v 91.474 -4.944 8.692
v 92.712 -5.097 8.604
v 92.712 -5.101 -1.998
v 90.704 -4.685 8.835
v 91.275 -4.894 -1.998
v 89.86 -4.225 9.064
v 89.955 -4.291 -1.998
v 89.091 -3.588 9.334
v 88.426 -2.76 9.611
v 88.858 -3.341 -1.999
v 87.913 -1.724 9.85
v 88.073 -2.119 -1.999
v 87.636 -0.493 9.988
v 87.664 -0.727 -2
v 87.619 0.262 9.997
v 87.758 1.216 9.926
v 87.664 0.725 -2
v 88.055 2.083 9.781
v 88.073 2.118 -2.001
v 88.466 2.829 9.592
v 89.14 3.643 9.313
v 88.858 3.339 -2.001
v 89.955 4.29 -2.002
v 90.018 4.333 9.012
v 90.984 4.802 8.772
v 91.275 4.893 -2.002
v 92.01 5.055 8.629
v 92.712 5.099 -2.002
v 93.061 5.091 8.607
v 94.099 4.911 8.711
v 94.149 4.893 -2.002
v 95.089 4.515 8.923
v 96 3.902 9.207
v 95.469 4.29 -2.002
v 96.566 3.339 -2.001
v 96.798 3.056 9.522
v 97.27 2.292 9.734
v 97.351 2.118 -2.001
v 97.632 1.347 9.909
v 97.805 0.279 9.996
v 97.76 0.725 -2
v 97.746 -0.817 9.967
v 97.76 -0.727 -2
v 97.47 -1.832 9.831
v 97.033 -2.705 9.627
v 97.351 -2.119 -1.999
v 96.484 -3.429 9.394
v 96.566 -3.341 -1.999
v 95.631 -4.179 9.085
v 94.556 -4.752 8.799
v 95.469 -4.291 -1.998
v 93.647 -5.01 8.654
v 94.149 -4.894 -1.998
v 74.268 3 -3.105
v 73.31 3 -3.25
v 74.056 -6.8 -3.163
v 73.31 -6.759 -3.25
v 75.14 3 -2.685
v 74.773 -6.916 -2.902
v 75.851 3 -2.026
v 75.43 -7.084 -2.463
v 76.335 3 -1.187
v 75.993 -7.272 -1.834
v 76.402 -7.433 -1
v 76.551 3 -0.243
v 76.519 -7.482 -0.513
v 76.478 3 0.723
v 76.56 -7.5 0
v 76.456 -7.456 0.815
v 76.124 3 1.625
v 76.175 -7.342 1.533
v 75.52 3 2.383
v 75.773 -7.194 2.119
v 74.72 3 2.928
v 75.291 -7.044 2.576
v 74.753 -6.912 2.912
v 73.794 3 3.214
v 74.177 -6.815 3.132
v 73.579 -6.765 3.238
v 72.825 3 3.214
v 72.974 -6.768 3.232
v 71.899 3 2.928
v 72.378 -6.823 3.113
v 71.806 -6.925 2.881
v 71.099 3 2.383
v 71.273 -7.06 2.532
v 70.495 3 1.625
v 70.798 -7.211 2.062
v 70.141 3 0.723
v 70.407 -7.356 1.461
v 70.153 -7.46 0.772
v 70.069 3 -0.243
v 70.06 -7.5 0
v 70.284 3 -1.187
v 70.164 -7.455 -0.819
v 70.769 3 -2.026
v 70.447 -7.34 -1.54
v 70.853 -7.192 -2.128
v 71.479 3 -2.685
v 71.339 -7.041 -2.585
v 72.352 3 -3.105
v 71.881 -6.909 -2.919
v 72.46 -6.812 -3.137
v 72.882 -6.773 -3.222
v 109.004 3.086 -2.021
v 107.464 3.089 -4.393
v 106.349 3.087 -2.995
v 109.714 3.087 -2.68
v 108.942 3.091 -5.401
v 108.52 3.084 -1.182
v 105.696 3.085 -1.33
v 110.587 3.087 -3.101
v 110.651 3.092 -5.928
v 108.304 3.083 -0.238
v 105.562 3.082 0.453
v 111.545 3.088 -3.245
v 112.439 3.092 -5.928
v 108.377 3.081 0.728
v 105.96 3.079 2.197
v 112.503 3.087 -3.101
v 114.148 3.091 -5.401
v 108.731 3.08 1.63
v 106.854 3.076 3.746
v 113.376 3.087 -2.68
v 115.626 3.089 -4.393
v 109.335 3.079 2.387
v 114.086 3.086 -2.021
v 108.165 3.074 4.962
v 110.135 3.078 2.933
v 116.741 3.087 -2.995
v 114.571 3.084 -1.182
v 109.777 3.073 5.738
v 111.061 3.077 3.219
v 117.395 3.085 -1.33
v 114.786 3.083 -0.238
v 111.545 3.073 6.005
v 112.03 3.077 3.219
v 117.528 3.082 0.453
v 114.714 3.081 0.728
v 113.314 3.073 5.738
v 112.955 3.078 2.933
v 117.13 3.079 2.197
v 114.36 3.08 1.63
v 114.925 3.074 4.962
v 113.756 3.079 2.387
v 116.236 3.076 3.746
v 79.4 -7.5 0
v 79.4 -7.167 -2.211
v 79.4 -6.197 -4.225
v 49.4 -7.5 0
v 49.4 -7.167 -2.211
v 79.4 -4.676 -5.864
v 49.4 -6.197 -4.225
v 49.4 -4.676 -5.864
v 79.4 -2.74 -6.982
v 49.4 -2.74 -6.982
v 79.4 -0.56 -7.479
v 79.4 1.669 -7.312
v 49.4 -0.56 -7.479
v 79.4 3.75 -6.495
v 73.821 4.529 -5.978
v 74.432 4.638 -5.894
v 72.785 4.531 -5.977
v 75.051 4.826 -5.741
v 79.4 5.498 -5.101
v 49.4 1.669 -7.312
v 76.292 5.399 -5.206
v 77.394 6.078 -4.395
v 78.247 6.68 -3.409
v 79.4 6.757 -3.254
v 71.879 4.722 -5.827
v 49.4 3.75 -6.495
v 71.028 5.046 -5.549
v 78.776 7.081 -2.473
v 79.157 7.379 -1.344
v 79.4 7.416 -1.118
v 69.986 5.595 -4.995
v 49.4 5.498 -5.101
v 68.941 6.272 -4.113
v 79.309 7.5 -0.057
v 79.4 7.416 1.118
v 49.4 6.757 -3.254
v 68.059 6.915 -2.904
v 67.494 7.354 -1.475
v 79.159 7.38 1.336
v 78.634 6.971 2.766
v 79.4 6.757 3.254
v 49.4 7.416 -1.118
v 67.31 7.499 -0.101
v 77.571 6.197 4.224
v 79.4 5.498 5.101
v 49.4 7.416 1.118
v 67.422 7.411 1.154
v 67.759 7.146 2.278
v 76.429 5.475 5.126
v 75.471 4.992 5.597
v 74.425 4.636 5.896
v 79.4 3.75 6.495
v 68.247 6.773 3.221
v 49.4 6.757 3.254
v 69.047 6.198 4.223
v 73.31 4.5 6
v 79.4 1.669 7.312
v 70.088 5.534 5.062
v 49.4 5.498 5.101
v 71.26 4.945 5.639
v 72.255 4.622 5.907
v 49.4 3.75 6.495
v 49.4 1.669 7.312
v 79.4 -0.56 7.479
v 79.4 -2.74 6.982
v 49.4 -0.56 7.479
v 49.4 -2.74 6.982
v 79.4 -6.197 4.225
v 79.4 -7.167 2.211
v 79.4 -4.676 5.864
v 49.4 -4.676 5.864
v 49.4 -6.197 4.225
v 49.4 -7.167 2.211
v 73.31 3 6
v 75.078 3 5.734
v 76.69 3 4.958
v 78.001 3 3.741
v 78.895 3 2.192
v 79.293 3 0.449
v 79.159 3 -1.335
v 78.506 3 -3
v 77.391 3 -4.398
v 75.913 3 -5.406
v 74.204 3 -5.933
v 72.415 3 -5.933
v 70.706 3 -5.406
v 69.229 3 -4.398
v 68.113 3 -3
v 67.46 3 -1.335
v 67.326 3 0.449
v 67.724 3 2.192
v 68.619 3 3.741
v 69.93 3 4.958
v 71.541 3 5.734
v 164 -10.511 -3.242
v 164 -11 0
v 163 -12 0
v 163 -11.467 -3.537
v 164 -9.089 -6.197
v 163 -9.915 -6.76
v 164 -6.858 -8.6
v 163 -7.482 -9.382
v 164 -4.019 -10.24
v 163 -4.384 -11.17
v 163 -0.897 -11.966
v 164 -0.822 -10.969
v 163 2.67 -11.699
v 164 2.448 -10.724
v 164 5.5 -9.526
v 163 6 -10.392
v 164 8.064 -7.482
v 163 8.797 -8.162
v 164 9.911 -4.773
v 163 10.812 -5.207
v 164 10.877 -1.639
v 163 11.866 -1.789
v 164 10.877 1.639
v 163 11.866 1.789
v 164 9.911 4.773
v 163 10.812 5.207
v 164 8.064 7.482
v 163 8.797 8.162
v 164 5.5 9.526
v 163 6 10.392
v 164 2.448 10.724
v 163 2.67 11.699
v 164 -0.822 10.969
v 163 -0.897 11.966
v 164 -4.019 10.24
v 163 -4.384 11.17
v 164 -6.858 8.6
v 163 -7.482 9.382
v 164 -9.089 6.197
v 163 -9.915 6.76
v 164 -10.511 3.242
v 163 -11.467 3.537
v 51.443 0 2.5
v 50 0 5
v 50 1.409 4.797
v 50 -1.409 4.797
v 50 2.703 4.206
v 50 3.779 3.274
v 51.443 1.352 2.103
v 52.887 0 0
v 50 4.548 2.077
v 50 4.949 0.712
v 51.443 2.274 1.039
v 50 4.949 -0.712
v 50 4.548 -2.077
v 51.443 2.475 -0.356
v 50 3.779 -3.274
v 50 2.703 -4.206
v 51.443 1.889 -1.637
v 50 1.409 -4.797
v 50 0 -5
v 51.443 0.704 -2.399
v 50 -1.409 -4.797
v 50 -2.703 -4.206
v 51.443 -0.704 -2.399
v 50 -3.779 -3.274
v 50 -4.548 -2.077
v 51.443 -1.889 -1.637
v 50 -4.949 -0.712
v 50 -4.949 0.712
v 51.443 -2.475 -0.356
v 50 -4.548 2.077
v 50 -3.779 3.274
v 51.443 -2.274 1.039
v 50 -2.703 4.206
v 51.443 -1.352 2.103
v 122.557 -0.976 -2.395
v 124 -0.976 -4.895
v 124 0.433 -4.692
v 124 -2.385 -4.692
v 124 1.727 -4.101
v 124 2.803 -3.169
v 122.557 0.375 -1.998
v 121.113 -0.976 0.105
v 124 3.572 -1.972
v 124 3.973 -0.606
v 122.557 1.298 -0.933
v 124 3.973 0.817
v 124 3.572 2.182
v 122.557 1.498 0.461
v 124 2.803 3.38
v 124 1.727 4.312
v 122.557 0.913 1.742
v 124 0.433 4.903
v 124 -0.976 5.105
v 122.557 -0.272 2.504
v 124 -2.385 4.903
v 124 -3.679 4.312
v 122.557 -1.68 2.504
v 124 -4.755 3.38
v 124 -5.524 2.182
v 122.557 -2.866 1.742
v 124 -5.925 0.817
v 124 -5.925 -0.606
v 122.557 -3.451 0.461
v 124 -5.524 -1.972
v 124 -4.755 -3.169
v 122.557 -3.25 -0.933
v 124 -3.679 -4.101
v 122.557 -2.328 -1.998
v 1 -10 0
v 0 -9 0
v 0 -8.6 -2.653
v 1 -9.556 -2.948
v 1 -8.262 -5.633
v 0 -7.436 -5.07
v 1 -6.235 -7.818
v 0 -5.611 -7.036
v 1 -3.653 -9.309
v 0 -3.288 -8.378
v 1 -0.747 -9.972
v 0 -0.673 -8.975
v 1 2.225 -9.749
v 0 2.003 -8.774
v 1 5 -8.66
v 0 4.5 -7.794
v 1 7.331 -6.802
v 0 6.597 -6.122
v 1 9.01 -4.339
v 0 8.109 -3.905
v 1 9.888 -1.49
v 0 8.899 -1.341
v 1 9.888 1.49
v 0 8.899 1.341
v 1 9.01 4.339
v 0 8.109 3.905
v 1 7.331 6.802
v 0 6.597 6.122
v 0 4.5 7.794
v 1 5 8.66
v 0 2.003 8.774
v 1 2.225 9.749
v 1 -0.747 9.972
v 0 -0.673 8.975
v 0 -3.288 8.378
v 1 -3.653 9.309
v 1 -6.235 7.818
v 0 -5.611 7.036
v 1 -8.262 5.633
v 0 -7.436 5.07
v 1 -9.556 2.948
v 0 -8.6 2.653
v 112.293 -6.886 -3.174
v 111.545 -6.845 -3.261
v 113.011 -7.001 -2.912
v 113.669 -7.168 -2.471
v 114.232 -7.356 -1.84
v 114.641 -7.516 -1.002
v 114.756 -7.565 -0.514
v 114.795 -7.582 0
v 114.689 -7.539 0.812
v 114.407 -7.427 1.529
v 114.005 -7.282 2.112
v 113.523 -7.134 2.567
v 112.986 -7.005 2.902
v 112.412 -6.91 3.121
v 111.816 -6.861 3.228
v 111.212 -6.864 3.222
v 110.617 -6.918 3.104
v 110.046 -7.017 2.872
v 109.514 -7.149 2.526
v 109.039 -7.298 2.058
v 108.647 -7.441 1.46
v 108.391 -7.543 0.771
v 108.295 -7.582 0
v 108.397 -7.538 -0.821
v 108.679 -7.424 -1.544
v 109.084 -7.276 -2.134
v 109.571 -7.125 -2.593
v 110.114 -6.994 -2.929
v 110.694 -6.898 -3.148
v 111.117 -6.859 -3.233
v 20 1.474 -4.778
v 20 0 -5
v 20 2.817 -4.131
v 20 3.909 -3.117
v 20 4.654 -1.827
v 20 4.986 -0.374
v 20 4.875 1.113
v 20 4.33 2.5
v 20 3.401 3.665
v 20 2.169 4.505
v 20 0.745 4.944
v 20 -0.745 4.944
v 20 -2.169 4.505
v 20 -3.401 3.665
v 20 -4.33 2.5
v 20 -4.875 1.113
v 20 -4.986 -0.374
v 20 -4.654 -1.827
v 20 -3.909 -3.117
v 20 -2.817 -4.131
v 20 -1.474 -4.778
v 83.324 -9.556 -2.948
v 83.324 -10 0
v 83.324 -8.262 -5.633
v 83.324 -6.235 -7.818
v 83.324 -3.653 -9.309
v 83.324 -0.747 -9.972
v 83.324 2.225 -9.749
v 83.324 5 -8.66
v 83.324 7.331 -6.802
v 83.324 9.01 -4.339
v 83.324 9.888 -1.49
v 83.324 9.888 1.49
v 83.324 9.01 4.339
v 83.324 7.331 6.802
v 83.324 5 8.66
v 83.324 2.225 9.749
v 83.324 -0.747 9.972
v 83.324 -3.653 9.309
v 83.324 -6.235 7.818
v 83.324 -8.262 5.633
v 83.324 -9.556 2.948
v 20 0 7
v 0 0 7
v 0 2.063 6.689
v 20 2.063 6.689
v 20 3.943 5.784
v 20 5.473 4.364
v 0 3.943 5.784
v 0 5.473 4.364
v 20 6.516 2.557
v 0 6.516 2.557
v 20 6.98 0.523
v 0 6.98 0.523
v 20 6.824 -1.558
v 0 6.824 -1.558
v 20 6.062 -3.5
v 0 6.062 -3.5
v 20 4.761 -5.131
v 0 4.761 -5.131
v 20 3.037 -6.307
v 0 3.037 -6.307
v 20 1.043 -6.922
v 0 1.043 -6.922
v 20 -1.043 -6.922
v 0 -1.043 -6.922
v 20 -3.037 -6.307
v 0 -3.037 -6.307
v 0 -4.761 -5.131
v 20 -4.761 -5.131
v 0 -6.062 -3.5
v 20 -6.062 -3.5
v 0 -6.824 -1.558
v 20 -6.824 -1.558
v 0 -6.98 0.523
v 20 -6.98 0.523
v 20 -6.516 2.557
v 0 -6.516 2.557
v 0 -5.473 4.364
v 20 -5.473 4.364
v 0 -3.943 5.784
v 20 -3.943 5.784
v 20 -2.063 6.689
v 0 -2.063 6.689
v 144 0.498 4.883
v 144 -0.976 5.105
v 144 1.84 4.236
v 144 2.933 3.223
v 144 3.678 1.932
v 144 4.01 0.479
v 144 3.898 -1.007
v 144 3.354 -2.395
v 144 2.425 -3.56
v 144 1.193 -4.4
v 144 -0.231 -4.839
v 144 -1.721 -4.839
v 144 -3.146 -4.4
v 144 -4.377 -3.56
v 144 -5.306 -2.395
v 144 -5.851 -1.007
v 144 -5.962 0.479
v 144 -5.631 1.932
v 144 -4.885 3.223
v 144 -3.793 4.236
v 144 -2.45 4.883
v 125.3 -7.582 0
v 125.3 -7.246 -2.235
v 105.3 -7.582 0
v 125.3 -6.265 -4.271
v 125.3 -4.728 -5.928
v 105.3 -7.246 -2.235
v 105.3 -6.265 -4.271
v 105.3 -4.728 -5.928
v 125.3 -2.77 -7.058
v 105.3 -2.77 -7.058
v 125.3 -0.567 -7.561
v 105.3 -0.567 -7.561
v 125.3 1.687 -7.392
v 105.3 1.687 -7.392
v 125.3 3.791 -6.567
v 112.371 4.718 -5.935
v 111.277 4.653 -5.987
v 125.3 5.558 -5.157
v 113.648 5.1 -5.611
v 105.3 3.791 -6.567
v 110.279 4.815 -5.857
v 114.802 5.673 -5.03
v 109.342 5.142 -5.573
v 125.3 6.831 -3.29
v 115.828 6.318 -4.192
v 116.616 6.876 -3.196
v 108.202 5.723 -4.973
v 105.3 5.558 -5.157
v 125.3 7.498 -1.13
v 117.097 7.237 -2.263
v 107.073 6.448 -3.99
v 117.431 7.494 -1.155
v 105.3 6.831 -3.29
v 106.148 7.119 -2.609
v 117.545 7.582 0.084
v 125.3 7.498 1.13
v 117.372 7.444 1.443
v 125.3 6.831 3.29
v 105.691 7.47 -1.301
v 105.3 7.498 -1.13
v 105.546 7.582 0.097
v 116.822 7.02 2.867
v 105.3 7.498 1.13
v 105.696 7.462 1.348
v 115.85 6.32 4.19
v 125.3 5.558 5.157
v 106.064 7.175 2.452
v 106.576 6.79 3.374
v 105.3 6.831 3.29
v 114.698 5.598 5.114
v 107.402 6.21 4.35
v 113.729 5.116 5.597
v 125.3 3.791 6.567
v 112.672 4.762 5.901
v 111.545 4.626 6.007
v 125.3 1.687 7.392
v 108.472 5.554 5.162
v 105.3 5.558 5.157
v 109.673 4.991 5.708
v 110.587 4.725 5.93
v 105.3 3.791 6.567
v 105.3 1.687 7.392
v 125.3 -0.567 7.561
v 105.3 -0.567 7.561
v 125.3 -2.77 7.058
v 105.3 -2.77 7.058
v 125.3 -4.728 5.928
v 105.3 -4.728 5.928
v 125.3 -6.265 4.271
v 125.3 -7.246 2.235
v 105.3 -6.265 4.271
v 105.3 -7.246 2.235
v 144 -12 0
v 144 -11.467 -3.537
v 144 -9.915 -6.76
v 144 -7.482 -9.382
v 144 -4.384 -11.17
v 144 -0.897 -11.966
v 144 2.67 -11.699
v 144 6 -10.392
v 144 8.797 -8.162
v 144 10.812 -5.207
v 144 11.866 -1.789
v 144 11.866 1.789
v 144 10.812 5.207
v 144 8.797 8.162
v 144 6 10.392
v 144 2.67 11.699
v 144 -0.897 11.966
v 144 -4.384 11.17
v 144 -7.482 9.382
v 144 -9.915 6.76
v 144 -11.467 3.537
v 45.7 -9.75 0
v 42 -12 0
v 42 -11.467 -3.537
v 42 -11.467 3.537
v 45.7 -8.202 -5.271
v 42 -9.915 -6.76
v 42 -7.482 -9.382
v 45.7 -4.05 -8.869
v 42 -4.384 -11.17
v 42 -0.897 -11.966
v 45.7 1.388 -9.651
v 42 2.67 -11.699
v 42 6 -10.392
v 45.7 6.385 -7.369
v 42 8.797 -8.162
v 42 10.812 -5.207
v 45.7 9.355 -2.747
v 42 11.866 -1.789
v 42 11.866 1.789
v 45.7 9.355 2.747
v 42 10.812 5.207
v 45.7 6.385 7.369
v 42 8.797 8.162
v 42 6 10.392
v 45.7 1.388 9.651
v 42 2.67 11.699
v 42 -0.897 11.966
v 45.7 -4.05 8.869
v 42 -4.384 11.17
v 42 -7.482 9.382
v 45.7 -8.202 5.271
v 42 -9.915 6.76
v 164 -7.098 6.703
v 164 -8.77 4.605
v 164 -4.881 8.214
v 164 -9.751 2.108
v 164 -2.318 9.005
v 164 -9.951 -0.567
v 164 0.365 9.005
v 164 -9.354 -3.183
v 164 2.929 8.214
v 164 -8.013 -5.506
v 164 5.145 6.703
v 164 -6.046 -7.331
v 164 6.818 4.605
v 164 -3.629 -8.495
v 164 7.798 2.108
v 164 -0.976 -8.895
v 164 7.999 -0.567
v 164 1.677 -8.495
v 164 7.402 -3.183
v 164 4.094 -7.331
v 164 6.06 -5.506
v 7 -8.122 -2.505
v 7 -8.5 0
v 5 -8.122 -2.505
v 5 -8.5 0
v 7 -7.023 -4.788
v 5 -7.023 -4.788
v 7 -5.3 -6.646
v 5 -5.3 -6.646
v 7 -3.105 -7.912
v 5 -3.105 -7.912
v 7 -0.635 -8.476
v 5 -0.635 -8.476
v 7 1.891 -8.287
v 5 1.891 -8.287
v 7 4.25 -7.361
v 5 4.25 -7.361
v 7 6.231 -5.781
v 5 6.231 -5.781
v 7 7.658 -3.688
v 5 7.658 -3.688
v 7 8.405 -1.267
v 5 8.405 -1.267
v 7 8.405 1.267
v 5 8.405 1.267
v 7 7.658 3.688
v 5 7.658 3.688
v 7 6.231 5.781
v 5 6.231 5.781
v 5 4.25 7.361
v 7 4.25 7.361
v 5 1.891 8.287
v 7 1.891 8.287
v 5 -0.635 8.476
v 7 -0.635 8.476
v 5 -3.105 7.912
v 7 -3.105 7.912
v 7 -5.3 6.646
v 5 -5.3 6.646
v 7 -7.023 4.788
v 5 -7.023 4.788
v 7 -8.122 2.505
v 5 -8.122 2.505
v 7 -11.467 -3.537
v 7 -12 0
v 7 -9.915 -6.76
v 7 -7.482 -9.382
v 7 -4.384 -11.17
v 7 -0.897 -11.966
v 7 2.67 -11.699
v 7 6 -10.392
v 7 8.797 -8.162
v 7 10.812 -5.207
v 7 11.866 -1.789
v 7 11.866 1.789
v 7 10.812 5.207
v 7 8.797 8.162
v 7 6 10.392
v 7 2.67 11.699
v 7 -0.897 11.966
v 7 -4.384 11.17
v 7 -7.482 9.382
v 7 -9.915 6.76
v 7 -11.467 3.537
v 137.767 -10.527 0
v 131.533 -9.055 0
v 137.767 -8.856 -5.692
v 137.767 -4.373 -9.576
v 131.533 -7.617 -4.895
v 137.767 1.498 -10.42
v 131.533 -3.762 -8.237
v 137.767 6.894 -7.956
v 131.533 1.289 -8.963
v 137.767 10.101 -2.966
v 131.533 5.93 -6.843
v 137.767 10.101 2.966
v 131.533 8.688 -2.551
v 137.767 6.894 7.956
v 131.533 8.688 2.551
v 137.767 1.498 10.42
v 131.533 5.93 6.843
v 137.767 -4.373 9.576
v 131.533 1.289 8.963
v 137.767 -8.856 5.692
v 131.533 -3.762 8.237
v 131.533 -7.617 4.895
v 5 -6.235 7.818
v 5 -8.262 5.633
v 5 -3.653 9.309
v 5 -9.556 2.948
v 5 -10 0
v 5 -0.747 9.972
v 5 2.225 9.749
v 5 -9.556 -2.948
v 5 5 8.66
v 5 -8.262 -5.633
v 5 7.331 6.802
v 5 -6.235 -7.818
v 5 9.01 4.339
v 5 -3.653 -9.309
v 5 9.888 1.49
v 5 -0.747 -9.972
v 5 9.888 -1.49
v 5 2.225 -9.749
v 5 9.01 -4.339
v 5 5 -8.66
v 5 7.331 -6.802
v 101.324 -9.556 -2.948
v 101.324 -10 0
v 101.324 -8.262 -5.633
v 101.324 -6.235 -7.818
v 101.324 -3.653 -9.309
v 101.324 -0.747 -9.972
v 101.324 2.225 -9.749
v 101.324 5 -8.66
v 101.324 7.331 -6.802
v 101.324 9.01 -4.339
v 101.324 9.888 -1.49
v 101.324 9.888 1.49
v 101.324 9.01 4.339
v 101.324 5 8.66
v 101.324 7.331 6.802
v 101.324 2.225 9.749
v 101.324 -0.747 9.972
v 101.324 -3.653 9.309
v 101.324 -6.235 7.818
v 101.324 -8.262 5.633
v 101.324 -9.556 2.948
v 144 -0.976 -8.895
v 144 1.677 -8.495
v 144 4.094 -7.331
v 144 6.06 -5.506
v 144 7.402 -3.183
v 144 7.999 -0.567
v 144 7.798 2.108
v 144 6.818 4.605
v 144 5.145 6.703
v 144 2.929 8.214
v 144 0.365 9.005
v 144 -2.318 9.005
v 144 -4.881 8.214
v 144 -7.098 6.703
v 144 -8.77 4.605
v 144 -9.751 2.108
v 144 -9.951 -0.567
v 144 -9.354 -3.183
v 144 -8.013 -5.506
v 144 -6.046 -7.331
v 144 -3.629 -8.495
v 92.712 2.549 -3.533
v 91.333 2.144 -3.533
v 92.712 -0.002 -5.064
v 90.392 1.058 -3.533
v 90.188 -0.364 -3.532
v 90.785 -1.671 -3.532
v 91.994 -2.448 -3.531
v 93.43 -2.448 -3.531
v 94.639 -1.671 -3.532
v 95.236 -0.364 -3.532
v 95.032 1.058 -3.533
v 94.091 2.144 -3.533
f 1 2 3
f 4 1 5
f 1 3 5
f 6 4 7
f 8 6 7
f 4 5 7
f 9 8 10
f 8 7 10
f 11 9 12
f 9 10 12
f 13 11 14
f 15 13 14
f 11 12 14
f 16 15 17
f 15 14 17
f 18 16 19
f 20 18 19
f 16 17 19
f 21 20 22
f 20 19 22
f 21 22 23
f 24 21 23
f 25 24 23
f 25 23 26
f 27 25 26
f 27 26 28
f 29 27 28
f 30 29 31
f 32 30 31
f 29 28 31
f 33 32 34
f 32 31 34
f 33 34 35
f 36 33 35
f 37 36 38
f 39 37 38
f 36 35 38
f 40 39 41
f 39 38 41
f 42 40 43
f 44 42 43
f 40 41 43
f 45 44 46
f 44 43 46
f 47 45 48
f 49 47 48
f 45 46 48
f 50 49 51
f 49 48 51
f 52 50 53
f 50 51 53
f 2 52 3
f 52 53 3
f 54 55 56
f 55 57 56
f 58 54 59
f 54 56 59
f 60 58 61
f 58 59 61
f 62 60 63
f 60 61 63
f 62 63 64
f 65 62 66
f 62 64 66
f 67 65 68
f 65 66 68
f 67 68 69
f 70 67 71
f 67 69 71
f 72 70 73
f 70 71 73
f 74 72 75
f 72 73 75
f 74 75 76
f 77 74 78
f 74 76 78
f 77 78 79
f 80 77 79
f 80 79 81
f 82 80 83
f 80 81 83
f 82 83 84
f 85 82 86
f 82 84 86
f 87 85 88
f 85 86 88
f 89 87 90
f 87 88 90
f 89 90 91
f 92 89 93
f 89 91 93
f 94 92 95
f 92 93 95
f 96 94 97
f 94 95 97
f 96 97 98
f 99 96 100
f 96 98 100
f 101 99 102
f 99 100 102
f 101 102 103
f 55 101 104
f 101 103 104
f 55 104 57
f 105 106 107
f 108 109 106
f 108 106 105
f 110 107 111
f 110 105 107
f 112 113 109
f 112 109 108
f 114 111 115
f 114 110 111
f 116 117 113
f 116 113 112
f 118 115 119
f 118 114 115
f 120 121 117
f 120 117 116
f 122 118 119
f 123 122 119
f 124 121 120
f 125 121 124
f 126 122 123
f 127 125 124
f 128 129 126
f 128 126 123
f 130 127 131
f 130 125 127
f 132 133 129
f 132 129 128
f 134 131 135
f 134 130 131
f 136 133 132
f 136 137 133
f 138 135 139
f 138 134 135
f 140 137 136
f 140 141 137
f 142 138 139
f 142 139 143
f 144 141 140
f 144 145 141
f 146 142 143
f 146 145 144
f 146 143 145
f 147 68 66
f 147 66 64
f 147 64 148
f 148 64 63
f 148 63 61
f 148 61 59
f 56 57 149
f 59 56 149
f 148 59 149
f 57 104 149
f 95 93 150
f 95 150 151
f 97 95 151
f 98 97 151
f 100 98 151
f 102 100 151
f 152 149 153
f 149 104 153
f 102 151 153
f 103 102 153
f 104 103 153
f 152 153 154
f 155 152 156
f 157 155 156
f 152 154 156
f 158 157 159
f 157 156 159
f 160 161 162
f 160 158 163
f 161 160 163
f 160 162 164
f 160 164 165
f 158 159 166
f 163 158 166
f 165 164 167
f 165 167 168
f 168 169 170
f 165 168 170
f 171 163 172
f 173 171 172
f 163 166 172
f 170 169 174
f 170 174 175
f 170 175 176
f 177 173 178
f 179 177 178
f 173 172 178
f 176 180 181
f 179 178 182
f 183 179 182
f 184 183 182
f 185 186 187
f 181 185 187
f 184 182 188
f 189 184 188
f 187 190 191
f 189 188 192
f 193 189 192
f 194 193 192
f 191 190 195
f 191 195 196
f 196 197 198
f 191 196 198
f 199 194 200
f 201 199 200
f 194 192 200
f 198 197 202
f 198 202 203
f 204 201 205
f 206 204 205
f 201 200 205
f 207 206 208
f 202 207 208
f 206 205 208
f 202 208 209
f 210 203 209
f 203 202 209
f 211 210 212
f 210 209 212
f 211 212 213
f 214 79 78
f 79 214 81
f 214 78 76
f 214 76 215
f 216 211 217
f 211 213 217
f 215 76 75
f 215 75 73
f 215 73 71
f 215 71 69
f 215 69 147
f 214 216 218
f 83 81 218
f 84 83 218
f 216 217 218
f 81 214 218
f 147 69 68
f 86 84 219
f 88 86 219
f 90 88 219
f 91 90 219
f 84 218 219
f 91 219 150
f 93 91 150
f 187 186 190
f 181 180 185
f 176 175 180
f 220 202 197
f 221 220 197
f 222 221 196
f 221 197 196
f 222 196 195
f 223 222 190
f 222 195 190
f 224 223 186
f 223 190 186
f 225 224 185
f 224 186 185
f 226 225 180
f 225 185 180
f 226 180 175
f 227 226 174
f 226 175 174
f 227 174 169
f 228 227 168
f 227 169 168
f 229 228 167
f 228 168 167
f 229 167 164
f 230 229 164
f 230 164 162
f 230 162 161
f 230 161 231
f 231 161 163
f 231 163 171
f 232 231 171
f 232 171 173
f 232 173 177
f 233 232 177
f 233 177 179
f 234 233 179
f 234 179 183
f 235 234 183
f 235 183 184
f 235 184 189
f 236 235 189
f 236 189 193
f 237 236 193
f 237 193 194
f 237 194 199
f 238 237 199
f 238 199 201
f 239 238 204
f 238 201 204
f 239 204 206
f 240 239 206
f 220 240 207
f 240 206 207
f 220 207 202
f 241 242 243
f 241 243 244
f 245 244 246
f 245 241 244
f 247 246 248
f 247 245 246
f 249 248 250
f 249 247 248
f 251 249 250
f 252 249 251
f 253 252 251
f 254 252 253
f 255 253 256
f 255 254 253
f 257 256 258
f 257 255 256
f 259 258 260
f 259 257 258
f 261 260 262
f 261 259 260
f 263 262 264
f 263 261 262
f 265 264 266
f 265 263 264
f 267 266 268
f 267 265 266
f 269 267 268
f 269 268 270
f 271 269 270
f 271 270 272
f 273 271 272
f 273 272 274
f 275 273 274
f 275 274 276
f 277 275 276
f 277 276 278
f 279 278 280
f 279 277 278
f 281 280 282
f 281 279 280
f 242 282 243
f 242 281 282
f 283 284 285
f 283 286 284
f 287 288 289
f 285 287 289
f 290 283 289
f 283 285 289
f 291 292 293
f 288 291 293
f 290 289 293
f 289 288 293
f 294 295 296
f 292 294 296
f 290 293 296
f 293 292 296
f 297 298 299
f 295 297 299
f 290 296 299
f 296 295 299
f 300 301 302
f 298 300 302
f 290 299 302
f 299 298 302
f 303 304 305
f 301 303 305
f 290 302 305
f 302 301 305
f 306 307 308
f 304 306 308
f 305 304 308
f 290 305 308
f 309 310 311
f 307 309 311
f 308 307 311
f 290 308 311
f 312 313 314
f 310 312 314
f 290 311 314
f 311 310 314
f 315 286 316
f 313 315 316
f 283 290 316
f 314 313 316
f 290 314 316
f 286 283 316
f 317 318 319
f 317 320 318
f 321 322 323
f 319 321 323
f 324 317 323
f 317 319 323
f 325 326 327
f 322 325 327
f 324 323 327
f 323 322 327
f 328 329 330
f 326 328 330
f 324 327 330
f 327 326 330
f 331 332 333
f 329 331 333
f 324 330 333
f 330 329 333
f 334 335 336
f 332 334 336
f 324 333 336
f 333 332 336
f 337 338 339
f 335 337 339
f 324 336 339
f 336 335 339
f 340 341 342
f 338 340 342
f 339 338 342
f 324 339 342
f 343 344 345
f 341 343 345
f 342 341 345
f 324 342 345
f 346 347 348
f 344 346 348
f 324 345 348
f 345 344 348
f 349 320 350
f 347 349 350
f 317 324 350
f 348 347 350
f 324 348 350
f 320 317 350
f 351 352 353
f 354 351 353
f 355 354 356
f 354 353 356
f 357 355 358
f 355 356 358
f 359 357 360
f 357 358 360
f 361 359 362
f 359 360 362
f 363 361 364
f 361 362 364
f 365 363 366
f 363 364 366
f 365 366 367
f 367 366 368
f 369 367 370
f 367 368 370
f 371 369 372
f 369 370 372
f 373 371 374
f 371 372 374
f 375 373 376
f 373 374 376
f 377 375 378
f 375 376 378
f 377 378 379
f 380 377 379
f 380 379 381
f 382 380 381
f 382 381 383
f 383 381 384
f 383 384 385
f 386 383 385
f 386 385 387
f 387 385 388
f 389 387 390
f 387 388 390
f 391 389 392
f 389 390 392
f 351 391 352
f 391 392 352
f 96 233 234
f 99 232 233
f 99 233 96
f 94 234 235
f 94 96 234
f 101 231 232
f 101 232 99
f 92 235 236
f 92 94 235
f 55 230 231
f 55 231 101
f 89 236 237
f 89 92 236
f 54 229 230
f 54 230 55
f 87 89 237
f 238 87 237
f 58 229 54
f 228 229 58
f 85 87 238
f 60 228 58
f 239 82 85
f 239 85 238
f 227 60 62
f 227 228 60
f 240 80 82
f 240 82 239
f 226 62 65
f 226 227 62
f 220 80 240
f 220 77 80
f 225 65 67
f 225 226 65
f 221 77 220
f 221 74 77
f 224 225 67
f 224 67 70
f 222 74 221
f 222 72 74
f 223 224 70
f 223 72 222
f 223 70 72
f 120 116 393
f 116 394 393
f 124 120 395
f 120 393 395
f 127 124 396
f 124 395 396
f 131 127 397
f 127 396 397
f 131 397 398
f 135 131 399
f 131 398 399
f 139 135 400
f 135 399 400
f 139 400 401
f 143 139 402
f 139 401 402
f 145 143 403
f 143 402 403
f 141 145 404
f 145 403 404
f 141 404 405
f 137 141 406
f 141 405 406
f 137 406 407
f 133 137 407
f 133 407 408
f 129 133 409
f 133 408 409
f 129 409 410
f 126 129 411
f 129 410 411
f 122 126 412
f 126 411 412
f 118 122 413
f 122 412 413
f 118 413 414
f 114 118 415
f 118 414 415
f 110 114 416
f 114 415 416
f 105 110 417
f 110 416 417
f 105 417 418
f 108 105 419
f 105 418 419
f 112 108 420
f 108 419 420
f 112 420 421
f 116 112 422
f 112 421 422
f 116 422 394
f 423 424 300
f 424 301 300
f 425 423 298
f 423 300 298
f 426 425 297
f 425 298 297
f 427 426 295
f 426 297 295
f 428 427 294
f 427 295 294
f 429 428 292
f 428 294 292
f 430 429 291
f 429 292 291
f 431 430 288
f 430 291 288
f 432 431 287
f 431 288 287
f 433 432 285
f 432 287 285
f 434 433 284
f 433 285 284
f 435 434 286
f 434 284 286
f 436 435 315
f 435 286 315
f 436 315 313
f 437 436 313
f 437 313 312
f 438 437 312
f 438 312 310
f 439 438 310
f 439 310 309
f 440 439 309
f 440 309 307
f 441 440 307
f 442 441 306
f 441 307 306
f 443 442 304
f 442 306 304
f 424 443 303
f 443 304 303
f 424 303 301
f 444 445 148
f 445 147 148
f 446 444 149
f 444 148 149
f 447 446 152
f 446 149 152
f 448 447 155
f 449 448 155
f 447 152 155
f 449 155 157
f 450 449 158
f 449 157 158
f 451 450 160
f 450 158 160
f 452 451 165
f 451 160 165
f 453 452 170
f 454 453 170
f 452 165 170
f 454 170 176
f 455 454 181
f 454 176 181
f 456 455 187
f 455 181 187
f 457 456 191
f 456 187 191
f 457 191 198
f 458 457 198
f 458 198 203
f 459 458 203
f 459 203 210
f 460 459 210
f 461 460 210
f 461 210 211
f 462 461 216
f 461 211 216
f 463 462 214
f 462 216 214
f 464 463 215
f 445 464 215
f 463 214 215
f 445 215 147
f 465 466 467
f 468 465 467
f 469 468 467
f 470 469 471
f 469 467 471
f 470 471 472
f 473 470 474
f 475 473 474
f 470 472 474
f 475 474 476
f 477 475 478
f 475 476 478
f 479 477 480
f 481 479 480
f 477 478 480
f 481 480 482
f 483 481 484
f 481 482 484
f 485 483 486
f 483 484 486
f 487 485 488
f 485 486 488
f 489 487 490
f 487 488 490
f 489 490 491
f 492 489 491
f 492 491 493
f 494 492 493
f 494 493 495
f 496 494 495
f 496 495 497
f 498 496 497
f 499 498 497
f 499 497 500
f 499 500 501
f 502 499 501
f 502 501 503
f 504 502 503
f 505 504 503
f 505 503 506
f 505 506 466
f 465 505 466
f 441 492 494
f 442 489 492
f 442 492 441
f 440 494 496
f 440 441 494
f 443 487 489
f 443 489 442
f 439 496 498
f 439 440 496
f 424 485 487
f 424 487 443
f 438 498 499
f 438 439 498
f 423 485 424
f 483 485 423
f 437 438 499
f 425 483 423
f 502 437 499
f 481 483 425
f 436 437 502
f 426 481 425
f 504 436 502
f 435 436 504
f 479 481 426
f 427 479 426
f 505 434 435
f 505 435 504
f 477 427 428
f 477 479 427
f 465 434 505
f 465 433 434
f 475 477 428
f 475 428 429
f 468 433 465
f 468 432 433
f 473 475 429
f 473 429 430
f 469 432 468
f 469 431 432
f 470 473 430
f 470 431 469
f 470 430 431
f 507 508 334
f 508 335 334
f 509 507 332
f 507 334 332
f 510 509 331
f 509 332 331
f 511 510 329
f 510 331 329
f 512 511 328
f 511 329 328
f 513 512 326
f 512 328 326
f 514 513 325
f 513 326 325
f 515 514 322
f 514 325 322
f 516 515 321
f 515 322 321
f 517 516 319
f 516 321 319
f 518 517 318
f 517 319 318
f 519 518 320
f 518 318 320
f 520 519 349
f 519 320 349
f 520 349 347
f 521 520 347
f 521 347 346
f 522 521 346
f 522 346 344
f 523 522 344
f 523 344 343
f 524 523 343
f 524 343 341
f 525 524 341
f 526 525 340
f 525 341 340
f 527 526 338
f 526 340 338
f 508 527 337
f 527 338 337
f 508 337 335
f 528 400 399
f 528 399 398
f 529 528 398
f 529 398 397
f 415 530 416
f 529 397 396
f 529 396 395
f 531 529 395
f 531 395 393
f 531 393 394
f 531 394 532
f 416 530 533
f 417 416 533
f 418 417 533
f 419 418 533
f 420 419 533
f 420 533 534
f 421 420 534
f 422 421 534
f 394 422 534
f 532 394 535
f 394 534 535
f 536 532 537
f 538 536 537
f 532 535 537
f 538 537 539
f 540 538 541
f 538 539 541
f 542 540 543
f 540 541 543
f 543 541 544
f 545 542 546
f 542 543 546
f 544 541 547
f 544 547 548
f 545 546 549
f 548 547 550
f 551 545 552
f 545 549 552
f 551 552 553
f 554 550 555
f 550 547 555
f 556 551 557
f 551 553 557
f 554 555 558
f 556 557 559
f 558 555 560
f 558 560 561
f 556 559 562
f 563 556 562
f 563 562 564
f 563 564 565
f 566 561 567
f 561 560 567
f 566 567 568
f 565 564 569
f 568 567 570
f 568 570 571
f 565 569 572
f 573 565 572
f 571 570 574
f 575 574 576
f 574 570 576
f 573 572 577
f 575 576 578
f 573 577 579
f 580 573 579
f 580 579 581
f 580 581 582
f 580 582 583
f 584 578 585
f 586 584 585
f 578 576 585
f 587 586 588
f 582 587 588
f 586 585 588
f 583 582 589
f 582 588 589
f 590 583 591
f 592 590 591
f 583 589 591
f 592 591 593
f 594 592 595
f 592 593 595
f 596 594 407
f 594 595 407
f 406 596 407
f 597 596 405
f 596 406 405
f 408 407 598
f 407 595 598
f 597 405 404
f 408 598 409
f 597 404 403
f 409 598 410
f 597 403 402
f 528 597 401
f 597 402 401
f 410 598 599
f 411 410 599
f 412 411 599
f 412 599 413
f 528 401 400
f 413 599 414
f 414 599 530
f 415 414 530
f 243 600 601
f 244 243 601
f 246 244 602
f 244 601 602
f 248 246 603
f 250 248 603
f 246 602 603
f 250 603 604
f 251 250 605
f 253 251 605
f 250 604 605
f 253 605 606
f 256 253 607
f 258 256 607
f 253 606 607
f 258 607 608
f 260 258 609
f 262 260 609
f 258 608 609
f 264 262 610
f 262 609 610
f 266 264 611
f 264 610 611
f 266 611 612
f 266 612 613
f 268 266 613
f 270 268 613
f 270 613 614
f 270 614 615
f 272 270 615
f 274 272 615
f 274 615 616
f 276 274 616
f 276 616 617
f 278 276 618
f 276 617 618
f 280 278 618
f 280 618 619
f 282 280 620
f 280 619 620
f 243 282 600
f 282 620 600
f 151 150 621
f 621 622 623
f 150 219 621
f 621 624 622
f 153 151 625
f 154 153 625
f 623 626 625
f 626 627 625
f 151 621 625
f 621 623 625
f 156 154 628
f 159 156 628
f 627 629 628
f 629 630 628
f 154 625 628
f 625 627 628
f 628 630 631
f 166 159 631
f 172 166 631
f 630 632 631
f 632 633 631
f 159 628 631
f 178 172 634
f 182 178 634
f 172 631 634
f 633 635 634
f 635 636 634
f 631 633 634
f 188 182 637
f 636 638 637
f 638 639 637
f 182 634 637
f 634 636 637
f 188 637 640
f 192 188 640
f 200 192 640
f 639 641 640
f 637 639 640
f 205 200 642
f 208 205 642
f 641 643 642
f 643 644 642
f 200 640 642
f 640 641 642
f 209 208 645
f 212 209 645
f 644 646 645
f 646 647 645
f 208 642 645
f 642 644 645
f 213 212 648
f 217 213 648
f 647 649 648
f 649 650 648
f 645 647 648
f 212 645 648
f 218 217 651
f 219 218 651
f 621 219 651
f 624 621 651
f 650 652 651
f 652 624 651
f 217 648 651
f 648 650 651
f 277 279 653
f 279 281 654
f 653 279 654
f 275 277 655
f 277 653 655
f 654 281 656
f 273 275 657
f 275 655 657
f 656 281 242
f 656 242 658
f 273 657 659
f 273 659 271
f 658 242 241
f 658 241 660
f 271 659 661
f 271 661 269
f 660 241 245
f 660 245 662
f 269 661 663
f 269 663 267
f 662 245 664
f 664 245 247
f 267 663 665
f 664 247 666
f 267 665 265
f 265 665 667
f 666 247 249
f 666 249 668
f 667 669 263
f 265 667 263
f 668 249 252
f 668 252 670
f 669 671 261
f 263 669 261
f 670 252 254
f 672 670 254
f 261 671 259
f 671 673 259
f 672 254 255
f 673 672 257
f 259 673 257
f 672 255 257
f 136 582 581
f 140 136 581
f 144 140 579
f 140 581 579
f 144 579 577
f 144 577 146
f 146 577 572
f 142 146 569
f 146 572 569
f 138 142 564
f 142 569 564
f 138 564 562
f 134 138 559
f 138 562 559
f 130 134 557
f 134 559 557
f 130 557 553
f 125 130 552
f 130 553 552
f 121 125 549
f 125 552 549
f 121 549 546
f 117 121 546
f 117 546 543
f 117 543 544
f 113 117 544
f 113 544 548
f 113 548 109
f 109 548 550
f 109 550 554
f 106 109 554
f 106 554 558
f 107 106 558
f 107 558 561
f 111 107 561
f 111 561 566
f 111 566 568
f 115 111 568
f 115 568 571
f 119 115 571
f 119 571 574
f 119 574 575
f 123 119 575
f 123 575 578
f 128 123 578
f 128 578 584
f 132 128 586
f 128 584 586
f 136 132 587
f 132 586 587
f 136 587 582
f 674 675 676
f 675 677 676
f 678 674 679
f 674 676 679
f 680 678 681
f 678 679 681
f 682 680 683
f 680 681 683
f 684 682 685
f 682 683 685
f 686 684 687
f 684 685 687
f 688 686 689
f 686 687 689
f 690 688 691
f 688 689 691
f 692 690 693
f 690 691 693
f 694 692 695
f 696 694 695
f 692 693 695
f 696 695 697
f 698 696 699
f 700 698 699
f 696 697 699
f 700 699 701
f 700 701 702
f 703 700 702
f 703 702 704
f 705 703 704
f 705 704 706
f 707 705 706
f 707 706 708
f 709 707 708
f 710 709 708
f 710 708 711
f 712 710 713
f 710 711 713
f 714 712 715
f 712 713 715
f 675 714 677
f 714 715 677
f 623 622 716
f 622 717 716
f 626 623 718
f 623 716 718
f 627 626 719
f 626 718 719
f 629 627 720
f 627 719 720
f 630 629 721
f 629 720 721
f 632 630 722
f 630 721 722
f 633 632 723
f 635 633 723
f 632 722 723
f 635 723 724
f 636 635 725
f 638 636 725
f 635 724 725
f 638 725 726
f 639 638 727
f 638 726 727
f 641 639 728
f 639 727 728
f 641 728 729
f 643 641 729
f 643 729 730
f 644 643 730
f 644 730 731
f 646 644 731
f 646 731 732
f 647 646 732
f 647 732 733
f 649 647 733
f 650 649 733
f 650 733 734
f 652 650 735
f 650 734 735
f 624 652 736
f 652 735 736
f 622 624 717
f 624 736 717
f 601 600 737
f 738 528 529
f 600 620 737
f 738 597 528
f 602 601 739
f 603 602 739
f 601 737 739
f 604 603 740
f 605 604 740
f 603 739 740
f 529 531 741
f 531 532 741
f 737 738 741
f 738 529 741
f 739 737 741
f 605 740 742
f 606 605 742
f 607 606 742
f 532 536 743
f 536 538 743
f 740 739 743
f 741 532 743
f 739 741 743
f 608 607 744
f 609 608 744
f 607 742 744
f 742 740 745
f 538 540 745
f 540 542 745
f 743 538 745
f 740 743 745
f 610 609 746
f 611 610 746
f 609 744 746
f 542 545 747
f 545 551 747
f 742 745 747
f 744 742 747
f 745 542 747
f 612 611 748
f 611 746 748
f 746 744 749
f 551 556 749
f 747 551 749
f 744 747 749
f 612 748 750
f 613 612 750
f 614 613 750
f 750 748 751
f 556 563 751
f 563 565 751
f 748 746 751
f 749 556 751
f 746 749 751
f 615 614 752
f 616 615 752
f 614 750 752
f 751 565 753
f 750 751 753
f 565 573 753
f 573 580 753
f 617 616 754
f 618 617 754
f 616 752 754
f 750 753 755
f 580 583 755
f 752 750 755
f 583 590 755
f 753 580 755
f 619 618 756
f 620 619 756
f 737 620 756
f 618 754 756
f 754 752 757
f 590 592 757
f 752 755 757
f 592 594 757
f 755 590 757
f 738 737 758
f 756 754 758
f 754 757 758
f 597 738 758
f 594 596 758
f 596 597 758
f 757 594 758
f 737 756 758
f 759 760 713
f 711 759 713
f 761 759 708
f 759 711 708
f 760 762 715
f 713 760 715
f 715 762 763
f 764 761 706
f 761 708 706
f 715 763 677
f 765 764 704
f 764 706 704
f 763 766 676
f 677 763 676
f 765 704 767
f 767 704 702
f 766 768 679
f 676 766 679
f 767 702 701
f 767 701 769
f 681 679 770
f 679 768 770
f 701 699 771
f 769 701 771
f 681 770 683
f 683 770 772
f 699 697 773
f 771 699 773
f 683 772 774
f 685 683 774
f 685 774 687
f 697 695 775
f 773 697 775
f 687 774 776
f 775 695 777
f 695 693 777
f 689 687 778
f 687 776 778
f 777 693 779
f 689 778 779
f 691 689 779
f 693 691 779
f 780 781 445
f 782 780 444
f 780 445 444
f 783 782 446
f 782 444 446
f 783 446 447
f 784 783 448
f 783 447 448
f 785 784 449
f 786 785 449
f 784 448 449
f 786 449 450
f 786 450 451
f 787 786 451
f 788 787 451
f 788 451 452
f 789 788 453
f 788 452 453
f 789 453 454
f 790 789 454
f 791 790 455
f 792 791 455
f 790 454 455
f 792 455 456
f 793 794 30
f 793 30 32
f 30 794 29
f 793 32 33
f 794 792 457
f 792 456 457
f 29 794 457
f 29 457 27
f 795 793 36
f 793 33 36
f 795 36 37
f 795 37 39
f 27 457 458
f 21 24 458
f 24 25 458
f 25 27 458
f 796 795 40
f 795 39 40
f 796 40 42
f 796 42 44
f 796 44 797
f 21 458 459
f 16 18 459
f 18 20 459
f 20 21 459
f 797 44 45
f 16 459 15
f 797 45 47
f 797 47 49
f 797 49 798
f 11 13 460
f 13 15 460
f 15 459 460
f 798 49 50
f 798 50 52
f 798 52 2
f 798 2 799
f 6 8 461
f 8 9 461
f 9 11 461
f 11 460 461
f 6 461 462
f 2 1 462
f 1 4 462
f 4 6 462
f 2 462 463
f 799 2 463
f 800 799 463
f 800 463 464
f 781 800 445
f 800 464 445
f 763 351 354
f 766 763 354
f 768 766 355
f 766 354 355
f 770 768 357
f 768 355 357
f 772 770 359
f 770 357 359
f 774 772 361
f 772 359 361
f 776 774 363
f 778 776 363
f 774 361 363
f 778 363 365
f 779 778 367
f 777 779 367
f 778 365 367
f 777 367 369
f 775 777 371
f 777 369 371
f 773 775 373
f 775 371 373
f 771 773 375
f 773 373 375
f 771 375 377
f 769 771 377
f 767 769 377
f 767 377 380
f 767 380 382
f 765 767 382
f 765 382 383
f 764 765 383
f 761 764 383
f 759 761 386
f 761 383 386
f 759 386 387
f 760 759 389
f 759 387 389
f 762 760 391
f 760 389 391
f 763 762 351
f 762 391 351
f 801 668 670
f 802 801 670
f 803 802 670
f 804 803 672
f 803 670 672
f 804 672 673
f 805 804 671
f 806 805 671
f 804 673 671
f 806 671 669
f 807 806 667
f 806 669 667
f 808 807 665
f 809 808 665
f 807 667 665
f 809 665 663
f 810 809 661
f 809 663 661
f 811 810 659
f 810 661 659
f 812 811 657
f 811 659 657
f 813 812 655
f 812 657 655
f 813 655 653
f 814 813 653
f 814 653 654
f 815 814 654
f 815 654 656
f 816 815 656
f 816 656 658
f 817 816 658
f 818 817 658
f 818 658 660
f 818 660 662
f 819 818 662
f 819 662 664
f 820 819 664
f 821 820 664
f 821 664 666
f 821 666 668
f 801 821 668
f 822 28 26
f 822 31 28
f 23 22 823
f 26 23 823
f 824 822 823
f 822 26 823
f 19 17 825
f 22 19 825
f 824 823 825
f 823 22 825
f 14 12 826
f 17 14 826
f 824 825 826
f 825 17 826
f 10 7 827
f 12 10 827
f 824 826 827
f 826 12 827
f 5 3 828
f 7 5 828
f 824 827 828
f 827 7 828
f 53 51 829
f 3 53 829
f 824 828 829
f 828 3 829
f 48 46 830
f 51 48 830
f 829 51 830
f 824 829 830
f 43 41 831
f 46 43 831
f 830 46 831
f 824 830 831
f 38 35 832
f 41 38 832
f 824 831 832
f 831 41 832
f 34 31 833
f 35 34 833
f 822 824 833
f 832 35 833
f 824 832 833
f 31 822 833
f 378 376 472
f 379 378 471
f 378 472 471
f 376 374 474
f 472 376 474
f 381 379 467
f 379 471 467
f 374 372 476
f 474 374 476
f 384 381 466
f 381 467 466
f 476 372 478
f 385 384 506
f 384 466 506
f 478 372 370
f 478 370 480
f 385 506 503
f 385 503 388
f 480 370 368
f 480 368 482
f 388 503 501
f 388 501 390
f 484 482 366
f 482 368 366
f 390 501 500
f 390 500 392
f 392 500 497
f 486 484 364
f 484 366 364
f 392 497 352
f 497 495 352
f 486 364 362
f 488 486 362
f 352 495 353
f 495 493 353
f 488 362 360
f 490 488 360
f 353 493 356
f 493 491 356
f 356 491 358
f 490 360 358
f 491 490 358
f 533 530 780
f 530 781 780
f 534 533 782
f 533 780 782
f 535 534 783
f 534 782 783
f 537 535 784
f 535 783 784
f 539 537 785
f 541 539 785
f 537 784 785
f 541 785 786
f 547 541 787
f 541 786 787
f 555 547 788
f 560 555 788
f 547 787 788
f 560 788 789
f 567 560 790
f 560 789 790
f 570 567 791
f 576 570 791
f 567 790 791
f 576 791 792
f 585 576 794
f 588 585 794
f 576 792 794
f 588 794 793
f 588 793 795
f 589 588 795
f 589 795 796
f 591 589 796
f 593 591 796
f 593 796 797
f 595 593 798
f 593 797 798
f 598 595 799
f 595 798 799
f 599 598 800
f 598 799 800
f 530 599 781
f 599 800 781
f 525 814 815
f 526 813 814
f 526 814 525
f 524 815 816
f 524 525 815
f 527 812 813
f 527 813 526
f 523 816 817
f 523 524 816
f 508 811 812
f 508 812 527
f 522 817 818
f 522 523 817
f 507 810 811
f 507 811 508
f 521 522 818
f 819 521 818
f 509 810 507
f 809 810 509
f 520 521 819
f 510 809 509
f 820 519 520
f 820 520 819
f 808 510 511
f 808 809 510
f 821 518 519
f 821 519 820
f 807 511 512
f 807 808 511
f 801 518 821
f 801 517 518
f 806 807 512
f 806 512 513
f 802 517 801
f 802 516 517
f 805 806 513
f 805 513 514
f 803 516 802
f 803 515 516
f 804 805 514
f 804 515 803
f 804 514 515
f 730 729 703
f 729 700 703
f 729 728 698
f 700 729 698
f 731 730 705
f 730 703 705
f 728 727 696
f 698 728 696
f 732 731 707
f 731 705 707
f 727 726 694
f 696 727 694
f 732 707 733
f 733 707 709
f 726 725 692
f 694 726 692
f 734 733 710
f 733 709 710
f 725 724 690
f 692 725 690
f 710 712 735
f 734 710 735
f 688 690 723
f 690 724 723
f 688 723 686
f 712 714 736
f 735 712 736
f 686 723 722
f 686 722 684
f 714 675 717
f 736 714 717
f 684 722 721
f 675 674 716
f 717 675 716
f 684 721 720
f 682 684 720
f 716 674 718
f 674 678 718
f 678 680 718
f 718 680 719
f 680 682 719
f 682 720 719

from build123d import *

# Parameters (mm, degrees)
HOLE_WIZARD_9_D            = 10
HOLE_WIZARD_9_DEPTH        = 50
HOLE_WIZARD_9_CBORE_D      = 14
HOLE_WIZARD_9_CBORE_DEPTH  = 20
HOLE_WIZARD_9_TIP          = 2.886751346
HOLE_WIZARD_M12_1_D        = 10.2
HOLE_WIZARD_M12_1_DEPTH    = 12
HOLE_WIZARD_M12_1_TIP      = 3.064389157
CHAMFER_1_SIZE             = 1
CHAMFER_2_SIZE             = 1
HOLE_WIZARD_12_D           = 10
HOLE_WIZARD_12_DEPTH       = 40
HOLE_WIZARD_12_CBORE_D     = 18
HOLE_WIZARD_12_CBORE_DEPTH = 20
HOLE_WIZARD_12_TIP         = 2.886751346
HOLE_WIZARD_14_D           = 6.5
HOLE_WIZARD_14_DEPTH       = 100
HOLE_WIZARD_14_CBORE_D     = 12
HOLE_WIZARD_14_CBORE_DEPTH = 4.5
HOLE_WIZARD_15_D           = 6.5
HOLE_WIZARD_15_DEPTH       = 100
HOLE_WIZARD_15_CBORE_D     = 12
HOLE_WIZARD_15_CBORE_DEPTH = 4.5


with BuildPart() as part:
    # 草图2 → 旋转2 (revolve)
    with BuildSketch(Plane.XY, mode=Mode.PRIVATE) as revolve_2_sk:
        Polygon((0, 10), (0, 0), (164, 0), (164, 12), (144, 12), (125.3, 7.582380862), (105.3, 7.582380862), (101.324359639, 10), (83.324359639, 10), (79.4, 7.5), (49.4, 7.5), (42, 12), (7, 12), (7, 8.5), (5, 8.5), (5, 10), align=None)
    revolve(revolve_2_sk.sketch.rotate(Axis((0, 0, 0), (1, 0, 0)), 180), axis=Axis((0, 0, 0), (1, 0, 0)))

    # 孔9
    with Locations(Plane.ZY):
        with Locations((0, 0)):
            CounterBoreHole(HOLE_WIZARD_9_D / 2, HOLE_WIZARD_9_CBORE_D / 2, HOLE_WIZARD_9_CBORE_DEPTH, depth=HOLE_WIZARD_9_DEPTH)
            with Locations((0, 0, -(HOLE_WIZARD_9_DEPTH + HOLE_WIZARD_9_TIP / 2))):  # 120° drill point
                Cone(0, HOLE_WIZARD_9_D / 2, HOLE_WIZARD_9_TIP, mode=Mode.SUBTRACT)

    # M12 螺纹孔1
    with Locations(Plane(origin=(92.712048687, 0.00356299, 9.999999365), x_dir=(0, 0.999999936526, -0.000356298984), z_dir=(0, 0.000356298984, 0.999999936526))):
        with Locations((0, 0)):
            Hole(HOLE_WIZARD_M12_1_D / 2, depth=HOLE_WIZARD_M12_1_DEPTH)
            with Locations((0, 0, -(HOLE_WIZARD_M12_1_DEPTH + HOLE_WIZARD_M12_1_TIP / 2))):  # 118° drill point
                Cone(0, HOLE_WIZARD_M12_1_D / 2, HOLE_WIZARD_M12_1_TIP, mode=Mode.SUBTRACT)

    # 倒角1
    chamfer_1_edges = [part.edges().sort_by_distance(p)[0] for p in [
        (164, 12, 0),
    ]]
    chamfer(chamfer_1_edges, length=CHAMFER_1_SIZE)

    # 倒角2
    chamfer_2_edges = [part.edges().sort_by_distance(p)[0] for p in [
        (0, 10, 0),
    ]]
    chamfer(chamfer_2_edges, length=CHAMFER_2_SIZE)

    # 孔12
    with Locations(Plane(origin=(164, 0, 0), x_dir=(0, 0, -1), z_dir=(1, 0, 0))):
        with Locations((-0.105297268, -0.976154466)):
            CounterBoreHole(HOLE_WIZARD_12_D / 2, HOLE_WIZARD_12_CBORE_D / 2, HOLE_WIZARD_12_CBORE_DEPTH, depth=HOLE_WIZARD_12_DEPTH)
            with Locations((0, 0, -(HOLE_WIZARD_12_DEPTH + HOLE_WIZARD_12_TIP / 2))):  # 120° drill point
                Cone(0, HOLE_WIZARD_12_D / 2, HOLE_WIZARD_12_TIP, mode=Mode.SUBTRACT)

    # 孔14
    with Locations(Plane(origin=(73.309592569, 7.499999992, 0.000348053), x_dir=(0, -4.6407092e-05, 0.999999998923), z_dir=(0, 0.999999998923, 4.6407092e-05))):
        with Locations((0, 0)):
            CounterBoreHole(HOLE_WIZARD_14_D / 2, HOLE_WIZARD_14_CBORE_D / 2, HOLE_WIZARD_14_CBORE_DEPTH, depth=HOLE_WIZARD_14_DEPTH)

    # 孔15
    with Locations(Plane(origin=(111.545186108, 7.582371257, 0.012068763), x_dir=(0, -0.001591685193, 0.999998733268), z_dir=(0, 0.999998733268, 0.001591685193))):
        with Locations((0, 0)):
            CounterBoreHole(HOLE_WIZARD_15_D / 2, HOLE_WIZARD_15_CBORE_D / 2, HOLE_WIZARD_15_CBORE_DEPTH, depth=HOLE_WIZARD_15_DEPTH)


solid = part.part
